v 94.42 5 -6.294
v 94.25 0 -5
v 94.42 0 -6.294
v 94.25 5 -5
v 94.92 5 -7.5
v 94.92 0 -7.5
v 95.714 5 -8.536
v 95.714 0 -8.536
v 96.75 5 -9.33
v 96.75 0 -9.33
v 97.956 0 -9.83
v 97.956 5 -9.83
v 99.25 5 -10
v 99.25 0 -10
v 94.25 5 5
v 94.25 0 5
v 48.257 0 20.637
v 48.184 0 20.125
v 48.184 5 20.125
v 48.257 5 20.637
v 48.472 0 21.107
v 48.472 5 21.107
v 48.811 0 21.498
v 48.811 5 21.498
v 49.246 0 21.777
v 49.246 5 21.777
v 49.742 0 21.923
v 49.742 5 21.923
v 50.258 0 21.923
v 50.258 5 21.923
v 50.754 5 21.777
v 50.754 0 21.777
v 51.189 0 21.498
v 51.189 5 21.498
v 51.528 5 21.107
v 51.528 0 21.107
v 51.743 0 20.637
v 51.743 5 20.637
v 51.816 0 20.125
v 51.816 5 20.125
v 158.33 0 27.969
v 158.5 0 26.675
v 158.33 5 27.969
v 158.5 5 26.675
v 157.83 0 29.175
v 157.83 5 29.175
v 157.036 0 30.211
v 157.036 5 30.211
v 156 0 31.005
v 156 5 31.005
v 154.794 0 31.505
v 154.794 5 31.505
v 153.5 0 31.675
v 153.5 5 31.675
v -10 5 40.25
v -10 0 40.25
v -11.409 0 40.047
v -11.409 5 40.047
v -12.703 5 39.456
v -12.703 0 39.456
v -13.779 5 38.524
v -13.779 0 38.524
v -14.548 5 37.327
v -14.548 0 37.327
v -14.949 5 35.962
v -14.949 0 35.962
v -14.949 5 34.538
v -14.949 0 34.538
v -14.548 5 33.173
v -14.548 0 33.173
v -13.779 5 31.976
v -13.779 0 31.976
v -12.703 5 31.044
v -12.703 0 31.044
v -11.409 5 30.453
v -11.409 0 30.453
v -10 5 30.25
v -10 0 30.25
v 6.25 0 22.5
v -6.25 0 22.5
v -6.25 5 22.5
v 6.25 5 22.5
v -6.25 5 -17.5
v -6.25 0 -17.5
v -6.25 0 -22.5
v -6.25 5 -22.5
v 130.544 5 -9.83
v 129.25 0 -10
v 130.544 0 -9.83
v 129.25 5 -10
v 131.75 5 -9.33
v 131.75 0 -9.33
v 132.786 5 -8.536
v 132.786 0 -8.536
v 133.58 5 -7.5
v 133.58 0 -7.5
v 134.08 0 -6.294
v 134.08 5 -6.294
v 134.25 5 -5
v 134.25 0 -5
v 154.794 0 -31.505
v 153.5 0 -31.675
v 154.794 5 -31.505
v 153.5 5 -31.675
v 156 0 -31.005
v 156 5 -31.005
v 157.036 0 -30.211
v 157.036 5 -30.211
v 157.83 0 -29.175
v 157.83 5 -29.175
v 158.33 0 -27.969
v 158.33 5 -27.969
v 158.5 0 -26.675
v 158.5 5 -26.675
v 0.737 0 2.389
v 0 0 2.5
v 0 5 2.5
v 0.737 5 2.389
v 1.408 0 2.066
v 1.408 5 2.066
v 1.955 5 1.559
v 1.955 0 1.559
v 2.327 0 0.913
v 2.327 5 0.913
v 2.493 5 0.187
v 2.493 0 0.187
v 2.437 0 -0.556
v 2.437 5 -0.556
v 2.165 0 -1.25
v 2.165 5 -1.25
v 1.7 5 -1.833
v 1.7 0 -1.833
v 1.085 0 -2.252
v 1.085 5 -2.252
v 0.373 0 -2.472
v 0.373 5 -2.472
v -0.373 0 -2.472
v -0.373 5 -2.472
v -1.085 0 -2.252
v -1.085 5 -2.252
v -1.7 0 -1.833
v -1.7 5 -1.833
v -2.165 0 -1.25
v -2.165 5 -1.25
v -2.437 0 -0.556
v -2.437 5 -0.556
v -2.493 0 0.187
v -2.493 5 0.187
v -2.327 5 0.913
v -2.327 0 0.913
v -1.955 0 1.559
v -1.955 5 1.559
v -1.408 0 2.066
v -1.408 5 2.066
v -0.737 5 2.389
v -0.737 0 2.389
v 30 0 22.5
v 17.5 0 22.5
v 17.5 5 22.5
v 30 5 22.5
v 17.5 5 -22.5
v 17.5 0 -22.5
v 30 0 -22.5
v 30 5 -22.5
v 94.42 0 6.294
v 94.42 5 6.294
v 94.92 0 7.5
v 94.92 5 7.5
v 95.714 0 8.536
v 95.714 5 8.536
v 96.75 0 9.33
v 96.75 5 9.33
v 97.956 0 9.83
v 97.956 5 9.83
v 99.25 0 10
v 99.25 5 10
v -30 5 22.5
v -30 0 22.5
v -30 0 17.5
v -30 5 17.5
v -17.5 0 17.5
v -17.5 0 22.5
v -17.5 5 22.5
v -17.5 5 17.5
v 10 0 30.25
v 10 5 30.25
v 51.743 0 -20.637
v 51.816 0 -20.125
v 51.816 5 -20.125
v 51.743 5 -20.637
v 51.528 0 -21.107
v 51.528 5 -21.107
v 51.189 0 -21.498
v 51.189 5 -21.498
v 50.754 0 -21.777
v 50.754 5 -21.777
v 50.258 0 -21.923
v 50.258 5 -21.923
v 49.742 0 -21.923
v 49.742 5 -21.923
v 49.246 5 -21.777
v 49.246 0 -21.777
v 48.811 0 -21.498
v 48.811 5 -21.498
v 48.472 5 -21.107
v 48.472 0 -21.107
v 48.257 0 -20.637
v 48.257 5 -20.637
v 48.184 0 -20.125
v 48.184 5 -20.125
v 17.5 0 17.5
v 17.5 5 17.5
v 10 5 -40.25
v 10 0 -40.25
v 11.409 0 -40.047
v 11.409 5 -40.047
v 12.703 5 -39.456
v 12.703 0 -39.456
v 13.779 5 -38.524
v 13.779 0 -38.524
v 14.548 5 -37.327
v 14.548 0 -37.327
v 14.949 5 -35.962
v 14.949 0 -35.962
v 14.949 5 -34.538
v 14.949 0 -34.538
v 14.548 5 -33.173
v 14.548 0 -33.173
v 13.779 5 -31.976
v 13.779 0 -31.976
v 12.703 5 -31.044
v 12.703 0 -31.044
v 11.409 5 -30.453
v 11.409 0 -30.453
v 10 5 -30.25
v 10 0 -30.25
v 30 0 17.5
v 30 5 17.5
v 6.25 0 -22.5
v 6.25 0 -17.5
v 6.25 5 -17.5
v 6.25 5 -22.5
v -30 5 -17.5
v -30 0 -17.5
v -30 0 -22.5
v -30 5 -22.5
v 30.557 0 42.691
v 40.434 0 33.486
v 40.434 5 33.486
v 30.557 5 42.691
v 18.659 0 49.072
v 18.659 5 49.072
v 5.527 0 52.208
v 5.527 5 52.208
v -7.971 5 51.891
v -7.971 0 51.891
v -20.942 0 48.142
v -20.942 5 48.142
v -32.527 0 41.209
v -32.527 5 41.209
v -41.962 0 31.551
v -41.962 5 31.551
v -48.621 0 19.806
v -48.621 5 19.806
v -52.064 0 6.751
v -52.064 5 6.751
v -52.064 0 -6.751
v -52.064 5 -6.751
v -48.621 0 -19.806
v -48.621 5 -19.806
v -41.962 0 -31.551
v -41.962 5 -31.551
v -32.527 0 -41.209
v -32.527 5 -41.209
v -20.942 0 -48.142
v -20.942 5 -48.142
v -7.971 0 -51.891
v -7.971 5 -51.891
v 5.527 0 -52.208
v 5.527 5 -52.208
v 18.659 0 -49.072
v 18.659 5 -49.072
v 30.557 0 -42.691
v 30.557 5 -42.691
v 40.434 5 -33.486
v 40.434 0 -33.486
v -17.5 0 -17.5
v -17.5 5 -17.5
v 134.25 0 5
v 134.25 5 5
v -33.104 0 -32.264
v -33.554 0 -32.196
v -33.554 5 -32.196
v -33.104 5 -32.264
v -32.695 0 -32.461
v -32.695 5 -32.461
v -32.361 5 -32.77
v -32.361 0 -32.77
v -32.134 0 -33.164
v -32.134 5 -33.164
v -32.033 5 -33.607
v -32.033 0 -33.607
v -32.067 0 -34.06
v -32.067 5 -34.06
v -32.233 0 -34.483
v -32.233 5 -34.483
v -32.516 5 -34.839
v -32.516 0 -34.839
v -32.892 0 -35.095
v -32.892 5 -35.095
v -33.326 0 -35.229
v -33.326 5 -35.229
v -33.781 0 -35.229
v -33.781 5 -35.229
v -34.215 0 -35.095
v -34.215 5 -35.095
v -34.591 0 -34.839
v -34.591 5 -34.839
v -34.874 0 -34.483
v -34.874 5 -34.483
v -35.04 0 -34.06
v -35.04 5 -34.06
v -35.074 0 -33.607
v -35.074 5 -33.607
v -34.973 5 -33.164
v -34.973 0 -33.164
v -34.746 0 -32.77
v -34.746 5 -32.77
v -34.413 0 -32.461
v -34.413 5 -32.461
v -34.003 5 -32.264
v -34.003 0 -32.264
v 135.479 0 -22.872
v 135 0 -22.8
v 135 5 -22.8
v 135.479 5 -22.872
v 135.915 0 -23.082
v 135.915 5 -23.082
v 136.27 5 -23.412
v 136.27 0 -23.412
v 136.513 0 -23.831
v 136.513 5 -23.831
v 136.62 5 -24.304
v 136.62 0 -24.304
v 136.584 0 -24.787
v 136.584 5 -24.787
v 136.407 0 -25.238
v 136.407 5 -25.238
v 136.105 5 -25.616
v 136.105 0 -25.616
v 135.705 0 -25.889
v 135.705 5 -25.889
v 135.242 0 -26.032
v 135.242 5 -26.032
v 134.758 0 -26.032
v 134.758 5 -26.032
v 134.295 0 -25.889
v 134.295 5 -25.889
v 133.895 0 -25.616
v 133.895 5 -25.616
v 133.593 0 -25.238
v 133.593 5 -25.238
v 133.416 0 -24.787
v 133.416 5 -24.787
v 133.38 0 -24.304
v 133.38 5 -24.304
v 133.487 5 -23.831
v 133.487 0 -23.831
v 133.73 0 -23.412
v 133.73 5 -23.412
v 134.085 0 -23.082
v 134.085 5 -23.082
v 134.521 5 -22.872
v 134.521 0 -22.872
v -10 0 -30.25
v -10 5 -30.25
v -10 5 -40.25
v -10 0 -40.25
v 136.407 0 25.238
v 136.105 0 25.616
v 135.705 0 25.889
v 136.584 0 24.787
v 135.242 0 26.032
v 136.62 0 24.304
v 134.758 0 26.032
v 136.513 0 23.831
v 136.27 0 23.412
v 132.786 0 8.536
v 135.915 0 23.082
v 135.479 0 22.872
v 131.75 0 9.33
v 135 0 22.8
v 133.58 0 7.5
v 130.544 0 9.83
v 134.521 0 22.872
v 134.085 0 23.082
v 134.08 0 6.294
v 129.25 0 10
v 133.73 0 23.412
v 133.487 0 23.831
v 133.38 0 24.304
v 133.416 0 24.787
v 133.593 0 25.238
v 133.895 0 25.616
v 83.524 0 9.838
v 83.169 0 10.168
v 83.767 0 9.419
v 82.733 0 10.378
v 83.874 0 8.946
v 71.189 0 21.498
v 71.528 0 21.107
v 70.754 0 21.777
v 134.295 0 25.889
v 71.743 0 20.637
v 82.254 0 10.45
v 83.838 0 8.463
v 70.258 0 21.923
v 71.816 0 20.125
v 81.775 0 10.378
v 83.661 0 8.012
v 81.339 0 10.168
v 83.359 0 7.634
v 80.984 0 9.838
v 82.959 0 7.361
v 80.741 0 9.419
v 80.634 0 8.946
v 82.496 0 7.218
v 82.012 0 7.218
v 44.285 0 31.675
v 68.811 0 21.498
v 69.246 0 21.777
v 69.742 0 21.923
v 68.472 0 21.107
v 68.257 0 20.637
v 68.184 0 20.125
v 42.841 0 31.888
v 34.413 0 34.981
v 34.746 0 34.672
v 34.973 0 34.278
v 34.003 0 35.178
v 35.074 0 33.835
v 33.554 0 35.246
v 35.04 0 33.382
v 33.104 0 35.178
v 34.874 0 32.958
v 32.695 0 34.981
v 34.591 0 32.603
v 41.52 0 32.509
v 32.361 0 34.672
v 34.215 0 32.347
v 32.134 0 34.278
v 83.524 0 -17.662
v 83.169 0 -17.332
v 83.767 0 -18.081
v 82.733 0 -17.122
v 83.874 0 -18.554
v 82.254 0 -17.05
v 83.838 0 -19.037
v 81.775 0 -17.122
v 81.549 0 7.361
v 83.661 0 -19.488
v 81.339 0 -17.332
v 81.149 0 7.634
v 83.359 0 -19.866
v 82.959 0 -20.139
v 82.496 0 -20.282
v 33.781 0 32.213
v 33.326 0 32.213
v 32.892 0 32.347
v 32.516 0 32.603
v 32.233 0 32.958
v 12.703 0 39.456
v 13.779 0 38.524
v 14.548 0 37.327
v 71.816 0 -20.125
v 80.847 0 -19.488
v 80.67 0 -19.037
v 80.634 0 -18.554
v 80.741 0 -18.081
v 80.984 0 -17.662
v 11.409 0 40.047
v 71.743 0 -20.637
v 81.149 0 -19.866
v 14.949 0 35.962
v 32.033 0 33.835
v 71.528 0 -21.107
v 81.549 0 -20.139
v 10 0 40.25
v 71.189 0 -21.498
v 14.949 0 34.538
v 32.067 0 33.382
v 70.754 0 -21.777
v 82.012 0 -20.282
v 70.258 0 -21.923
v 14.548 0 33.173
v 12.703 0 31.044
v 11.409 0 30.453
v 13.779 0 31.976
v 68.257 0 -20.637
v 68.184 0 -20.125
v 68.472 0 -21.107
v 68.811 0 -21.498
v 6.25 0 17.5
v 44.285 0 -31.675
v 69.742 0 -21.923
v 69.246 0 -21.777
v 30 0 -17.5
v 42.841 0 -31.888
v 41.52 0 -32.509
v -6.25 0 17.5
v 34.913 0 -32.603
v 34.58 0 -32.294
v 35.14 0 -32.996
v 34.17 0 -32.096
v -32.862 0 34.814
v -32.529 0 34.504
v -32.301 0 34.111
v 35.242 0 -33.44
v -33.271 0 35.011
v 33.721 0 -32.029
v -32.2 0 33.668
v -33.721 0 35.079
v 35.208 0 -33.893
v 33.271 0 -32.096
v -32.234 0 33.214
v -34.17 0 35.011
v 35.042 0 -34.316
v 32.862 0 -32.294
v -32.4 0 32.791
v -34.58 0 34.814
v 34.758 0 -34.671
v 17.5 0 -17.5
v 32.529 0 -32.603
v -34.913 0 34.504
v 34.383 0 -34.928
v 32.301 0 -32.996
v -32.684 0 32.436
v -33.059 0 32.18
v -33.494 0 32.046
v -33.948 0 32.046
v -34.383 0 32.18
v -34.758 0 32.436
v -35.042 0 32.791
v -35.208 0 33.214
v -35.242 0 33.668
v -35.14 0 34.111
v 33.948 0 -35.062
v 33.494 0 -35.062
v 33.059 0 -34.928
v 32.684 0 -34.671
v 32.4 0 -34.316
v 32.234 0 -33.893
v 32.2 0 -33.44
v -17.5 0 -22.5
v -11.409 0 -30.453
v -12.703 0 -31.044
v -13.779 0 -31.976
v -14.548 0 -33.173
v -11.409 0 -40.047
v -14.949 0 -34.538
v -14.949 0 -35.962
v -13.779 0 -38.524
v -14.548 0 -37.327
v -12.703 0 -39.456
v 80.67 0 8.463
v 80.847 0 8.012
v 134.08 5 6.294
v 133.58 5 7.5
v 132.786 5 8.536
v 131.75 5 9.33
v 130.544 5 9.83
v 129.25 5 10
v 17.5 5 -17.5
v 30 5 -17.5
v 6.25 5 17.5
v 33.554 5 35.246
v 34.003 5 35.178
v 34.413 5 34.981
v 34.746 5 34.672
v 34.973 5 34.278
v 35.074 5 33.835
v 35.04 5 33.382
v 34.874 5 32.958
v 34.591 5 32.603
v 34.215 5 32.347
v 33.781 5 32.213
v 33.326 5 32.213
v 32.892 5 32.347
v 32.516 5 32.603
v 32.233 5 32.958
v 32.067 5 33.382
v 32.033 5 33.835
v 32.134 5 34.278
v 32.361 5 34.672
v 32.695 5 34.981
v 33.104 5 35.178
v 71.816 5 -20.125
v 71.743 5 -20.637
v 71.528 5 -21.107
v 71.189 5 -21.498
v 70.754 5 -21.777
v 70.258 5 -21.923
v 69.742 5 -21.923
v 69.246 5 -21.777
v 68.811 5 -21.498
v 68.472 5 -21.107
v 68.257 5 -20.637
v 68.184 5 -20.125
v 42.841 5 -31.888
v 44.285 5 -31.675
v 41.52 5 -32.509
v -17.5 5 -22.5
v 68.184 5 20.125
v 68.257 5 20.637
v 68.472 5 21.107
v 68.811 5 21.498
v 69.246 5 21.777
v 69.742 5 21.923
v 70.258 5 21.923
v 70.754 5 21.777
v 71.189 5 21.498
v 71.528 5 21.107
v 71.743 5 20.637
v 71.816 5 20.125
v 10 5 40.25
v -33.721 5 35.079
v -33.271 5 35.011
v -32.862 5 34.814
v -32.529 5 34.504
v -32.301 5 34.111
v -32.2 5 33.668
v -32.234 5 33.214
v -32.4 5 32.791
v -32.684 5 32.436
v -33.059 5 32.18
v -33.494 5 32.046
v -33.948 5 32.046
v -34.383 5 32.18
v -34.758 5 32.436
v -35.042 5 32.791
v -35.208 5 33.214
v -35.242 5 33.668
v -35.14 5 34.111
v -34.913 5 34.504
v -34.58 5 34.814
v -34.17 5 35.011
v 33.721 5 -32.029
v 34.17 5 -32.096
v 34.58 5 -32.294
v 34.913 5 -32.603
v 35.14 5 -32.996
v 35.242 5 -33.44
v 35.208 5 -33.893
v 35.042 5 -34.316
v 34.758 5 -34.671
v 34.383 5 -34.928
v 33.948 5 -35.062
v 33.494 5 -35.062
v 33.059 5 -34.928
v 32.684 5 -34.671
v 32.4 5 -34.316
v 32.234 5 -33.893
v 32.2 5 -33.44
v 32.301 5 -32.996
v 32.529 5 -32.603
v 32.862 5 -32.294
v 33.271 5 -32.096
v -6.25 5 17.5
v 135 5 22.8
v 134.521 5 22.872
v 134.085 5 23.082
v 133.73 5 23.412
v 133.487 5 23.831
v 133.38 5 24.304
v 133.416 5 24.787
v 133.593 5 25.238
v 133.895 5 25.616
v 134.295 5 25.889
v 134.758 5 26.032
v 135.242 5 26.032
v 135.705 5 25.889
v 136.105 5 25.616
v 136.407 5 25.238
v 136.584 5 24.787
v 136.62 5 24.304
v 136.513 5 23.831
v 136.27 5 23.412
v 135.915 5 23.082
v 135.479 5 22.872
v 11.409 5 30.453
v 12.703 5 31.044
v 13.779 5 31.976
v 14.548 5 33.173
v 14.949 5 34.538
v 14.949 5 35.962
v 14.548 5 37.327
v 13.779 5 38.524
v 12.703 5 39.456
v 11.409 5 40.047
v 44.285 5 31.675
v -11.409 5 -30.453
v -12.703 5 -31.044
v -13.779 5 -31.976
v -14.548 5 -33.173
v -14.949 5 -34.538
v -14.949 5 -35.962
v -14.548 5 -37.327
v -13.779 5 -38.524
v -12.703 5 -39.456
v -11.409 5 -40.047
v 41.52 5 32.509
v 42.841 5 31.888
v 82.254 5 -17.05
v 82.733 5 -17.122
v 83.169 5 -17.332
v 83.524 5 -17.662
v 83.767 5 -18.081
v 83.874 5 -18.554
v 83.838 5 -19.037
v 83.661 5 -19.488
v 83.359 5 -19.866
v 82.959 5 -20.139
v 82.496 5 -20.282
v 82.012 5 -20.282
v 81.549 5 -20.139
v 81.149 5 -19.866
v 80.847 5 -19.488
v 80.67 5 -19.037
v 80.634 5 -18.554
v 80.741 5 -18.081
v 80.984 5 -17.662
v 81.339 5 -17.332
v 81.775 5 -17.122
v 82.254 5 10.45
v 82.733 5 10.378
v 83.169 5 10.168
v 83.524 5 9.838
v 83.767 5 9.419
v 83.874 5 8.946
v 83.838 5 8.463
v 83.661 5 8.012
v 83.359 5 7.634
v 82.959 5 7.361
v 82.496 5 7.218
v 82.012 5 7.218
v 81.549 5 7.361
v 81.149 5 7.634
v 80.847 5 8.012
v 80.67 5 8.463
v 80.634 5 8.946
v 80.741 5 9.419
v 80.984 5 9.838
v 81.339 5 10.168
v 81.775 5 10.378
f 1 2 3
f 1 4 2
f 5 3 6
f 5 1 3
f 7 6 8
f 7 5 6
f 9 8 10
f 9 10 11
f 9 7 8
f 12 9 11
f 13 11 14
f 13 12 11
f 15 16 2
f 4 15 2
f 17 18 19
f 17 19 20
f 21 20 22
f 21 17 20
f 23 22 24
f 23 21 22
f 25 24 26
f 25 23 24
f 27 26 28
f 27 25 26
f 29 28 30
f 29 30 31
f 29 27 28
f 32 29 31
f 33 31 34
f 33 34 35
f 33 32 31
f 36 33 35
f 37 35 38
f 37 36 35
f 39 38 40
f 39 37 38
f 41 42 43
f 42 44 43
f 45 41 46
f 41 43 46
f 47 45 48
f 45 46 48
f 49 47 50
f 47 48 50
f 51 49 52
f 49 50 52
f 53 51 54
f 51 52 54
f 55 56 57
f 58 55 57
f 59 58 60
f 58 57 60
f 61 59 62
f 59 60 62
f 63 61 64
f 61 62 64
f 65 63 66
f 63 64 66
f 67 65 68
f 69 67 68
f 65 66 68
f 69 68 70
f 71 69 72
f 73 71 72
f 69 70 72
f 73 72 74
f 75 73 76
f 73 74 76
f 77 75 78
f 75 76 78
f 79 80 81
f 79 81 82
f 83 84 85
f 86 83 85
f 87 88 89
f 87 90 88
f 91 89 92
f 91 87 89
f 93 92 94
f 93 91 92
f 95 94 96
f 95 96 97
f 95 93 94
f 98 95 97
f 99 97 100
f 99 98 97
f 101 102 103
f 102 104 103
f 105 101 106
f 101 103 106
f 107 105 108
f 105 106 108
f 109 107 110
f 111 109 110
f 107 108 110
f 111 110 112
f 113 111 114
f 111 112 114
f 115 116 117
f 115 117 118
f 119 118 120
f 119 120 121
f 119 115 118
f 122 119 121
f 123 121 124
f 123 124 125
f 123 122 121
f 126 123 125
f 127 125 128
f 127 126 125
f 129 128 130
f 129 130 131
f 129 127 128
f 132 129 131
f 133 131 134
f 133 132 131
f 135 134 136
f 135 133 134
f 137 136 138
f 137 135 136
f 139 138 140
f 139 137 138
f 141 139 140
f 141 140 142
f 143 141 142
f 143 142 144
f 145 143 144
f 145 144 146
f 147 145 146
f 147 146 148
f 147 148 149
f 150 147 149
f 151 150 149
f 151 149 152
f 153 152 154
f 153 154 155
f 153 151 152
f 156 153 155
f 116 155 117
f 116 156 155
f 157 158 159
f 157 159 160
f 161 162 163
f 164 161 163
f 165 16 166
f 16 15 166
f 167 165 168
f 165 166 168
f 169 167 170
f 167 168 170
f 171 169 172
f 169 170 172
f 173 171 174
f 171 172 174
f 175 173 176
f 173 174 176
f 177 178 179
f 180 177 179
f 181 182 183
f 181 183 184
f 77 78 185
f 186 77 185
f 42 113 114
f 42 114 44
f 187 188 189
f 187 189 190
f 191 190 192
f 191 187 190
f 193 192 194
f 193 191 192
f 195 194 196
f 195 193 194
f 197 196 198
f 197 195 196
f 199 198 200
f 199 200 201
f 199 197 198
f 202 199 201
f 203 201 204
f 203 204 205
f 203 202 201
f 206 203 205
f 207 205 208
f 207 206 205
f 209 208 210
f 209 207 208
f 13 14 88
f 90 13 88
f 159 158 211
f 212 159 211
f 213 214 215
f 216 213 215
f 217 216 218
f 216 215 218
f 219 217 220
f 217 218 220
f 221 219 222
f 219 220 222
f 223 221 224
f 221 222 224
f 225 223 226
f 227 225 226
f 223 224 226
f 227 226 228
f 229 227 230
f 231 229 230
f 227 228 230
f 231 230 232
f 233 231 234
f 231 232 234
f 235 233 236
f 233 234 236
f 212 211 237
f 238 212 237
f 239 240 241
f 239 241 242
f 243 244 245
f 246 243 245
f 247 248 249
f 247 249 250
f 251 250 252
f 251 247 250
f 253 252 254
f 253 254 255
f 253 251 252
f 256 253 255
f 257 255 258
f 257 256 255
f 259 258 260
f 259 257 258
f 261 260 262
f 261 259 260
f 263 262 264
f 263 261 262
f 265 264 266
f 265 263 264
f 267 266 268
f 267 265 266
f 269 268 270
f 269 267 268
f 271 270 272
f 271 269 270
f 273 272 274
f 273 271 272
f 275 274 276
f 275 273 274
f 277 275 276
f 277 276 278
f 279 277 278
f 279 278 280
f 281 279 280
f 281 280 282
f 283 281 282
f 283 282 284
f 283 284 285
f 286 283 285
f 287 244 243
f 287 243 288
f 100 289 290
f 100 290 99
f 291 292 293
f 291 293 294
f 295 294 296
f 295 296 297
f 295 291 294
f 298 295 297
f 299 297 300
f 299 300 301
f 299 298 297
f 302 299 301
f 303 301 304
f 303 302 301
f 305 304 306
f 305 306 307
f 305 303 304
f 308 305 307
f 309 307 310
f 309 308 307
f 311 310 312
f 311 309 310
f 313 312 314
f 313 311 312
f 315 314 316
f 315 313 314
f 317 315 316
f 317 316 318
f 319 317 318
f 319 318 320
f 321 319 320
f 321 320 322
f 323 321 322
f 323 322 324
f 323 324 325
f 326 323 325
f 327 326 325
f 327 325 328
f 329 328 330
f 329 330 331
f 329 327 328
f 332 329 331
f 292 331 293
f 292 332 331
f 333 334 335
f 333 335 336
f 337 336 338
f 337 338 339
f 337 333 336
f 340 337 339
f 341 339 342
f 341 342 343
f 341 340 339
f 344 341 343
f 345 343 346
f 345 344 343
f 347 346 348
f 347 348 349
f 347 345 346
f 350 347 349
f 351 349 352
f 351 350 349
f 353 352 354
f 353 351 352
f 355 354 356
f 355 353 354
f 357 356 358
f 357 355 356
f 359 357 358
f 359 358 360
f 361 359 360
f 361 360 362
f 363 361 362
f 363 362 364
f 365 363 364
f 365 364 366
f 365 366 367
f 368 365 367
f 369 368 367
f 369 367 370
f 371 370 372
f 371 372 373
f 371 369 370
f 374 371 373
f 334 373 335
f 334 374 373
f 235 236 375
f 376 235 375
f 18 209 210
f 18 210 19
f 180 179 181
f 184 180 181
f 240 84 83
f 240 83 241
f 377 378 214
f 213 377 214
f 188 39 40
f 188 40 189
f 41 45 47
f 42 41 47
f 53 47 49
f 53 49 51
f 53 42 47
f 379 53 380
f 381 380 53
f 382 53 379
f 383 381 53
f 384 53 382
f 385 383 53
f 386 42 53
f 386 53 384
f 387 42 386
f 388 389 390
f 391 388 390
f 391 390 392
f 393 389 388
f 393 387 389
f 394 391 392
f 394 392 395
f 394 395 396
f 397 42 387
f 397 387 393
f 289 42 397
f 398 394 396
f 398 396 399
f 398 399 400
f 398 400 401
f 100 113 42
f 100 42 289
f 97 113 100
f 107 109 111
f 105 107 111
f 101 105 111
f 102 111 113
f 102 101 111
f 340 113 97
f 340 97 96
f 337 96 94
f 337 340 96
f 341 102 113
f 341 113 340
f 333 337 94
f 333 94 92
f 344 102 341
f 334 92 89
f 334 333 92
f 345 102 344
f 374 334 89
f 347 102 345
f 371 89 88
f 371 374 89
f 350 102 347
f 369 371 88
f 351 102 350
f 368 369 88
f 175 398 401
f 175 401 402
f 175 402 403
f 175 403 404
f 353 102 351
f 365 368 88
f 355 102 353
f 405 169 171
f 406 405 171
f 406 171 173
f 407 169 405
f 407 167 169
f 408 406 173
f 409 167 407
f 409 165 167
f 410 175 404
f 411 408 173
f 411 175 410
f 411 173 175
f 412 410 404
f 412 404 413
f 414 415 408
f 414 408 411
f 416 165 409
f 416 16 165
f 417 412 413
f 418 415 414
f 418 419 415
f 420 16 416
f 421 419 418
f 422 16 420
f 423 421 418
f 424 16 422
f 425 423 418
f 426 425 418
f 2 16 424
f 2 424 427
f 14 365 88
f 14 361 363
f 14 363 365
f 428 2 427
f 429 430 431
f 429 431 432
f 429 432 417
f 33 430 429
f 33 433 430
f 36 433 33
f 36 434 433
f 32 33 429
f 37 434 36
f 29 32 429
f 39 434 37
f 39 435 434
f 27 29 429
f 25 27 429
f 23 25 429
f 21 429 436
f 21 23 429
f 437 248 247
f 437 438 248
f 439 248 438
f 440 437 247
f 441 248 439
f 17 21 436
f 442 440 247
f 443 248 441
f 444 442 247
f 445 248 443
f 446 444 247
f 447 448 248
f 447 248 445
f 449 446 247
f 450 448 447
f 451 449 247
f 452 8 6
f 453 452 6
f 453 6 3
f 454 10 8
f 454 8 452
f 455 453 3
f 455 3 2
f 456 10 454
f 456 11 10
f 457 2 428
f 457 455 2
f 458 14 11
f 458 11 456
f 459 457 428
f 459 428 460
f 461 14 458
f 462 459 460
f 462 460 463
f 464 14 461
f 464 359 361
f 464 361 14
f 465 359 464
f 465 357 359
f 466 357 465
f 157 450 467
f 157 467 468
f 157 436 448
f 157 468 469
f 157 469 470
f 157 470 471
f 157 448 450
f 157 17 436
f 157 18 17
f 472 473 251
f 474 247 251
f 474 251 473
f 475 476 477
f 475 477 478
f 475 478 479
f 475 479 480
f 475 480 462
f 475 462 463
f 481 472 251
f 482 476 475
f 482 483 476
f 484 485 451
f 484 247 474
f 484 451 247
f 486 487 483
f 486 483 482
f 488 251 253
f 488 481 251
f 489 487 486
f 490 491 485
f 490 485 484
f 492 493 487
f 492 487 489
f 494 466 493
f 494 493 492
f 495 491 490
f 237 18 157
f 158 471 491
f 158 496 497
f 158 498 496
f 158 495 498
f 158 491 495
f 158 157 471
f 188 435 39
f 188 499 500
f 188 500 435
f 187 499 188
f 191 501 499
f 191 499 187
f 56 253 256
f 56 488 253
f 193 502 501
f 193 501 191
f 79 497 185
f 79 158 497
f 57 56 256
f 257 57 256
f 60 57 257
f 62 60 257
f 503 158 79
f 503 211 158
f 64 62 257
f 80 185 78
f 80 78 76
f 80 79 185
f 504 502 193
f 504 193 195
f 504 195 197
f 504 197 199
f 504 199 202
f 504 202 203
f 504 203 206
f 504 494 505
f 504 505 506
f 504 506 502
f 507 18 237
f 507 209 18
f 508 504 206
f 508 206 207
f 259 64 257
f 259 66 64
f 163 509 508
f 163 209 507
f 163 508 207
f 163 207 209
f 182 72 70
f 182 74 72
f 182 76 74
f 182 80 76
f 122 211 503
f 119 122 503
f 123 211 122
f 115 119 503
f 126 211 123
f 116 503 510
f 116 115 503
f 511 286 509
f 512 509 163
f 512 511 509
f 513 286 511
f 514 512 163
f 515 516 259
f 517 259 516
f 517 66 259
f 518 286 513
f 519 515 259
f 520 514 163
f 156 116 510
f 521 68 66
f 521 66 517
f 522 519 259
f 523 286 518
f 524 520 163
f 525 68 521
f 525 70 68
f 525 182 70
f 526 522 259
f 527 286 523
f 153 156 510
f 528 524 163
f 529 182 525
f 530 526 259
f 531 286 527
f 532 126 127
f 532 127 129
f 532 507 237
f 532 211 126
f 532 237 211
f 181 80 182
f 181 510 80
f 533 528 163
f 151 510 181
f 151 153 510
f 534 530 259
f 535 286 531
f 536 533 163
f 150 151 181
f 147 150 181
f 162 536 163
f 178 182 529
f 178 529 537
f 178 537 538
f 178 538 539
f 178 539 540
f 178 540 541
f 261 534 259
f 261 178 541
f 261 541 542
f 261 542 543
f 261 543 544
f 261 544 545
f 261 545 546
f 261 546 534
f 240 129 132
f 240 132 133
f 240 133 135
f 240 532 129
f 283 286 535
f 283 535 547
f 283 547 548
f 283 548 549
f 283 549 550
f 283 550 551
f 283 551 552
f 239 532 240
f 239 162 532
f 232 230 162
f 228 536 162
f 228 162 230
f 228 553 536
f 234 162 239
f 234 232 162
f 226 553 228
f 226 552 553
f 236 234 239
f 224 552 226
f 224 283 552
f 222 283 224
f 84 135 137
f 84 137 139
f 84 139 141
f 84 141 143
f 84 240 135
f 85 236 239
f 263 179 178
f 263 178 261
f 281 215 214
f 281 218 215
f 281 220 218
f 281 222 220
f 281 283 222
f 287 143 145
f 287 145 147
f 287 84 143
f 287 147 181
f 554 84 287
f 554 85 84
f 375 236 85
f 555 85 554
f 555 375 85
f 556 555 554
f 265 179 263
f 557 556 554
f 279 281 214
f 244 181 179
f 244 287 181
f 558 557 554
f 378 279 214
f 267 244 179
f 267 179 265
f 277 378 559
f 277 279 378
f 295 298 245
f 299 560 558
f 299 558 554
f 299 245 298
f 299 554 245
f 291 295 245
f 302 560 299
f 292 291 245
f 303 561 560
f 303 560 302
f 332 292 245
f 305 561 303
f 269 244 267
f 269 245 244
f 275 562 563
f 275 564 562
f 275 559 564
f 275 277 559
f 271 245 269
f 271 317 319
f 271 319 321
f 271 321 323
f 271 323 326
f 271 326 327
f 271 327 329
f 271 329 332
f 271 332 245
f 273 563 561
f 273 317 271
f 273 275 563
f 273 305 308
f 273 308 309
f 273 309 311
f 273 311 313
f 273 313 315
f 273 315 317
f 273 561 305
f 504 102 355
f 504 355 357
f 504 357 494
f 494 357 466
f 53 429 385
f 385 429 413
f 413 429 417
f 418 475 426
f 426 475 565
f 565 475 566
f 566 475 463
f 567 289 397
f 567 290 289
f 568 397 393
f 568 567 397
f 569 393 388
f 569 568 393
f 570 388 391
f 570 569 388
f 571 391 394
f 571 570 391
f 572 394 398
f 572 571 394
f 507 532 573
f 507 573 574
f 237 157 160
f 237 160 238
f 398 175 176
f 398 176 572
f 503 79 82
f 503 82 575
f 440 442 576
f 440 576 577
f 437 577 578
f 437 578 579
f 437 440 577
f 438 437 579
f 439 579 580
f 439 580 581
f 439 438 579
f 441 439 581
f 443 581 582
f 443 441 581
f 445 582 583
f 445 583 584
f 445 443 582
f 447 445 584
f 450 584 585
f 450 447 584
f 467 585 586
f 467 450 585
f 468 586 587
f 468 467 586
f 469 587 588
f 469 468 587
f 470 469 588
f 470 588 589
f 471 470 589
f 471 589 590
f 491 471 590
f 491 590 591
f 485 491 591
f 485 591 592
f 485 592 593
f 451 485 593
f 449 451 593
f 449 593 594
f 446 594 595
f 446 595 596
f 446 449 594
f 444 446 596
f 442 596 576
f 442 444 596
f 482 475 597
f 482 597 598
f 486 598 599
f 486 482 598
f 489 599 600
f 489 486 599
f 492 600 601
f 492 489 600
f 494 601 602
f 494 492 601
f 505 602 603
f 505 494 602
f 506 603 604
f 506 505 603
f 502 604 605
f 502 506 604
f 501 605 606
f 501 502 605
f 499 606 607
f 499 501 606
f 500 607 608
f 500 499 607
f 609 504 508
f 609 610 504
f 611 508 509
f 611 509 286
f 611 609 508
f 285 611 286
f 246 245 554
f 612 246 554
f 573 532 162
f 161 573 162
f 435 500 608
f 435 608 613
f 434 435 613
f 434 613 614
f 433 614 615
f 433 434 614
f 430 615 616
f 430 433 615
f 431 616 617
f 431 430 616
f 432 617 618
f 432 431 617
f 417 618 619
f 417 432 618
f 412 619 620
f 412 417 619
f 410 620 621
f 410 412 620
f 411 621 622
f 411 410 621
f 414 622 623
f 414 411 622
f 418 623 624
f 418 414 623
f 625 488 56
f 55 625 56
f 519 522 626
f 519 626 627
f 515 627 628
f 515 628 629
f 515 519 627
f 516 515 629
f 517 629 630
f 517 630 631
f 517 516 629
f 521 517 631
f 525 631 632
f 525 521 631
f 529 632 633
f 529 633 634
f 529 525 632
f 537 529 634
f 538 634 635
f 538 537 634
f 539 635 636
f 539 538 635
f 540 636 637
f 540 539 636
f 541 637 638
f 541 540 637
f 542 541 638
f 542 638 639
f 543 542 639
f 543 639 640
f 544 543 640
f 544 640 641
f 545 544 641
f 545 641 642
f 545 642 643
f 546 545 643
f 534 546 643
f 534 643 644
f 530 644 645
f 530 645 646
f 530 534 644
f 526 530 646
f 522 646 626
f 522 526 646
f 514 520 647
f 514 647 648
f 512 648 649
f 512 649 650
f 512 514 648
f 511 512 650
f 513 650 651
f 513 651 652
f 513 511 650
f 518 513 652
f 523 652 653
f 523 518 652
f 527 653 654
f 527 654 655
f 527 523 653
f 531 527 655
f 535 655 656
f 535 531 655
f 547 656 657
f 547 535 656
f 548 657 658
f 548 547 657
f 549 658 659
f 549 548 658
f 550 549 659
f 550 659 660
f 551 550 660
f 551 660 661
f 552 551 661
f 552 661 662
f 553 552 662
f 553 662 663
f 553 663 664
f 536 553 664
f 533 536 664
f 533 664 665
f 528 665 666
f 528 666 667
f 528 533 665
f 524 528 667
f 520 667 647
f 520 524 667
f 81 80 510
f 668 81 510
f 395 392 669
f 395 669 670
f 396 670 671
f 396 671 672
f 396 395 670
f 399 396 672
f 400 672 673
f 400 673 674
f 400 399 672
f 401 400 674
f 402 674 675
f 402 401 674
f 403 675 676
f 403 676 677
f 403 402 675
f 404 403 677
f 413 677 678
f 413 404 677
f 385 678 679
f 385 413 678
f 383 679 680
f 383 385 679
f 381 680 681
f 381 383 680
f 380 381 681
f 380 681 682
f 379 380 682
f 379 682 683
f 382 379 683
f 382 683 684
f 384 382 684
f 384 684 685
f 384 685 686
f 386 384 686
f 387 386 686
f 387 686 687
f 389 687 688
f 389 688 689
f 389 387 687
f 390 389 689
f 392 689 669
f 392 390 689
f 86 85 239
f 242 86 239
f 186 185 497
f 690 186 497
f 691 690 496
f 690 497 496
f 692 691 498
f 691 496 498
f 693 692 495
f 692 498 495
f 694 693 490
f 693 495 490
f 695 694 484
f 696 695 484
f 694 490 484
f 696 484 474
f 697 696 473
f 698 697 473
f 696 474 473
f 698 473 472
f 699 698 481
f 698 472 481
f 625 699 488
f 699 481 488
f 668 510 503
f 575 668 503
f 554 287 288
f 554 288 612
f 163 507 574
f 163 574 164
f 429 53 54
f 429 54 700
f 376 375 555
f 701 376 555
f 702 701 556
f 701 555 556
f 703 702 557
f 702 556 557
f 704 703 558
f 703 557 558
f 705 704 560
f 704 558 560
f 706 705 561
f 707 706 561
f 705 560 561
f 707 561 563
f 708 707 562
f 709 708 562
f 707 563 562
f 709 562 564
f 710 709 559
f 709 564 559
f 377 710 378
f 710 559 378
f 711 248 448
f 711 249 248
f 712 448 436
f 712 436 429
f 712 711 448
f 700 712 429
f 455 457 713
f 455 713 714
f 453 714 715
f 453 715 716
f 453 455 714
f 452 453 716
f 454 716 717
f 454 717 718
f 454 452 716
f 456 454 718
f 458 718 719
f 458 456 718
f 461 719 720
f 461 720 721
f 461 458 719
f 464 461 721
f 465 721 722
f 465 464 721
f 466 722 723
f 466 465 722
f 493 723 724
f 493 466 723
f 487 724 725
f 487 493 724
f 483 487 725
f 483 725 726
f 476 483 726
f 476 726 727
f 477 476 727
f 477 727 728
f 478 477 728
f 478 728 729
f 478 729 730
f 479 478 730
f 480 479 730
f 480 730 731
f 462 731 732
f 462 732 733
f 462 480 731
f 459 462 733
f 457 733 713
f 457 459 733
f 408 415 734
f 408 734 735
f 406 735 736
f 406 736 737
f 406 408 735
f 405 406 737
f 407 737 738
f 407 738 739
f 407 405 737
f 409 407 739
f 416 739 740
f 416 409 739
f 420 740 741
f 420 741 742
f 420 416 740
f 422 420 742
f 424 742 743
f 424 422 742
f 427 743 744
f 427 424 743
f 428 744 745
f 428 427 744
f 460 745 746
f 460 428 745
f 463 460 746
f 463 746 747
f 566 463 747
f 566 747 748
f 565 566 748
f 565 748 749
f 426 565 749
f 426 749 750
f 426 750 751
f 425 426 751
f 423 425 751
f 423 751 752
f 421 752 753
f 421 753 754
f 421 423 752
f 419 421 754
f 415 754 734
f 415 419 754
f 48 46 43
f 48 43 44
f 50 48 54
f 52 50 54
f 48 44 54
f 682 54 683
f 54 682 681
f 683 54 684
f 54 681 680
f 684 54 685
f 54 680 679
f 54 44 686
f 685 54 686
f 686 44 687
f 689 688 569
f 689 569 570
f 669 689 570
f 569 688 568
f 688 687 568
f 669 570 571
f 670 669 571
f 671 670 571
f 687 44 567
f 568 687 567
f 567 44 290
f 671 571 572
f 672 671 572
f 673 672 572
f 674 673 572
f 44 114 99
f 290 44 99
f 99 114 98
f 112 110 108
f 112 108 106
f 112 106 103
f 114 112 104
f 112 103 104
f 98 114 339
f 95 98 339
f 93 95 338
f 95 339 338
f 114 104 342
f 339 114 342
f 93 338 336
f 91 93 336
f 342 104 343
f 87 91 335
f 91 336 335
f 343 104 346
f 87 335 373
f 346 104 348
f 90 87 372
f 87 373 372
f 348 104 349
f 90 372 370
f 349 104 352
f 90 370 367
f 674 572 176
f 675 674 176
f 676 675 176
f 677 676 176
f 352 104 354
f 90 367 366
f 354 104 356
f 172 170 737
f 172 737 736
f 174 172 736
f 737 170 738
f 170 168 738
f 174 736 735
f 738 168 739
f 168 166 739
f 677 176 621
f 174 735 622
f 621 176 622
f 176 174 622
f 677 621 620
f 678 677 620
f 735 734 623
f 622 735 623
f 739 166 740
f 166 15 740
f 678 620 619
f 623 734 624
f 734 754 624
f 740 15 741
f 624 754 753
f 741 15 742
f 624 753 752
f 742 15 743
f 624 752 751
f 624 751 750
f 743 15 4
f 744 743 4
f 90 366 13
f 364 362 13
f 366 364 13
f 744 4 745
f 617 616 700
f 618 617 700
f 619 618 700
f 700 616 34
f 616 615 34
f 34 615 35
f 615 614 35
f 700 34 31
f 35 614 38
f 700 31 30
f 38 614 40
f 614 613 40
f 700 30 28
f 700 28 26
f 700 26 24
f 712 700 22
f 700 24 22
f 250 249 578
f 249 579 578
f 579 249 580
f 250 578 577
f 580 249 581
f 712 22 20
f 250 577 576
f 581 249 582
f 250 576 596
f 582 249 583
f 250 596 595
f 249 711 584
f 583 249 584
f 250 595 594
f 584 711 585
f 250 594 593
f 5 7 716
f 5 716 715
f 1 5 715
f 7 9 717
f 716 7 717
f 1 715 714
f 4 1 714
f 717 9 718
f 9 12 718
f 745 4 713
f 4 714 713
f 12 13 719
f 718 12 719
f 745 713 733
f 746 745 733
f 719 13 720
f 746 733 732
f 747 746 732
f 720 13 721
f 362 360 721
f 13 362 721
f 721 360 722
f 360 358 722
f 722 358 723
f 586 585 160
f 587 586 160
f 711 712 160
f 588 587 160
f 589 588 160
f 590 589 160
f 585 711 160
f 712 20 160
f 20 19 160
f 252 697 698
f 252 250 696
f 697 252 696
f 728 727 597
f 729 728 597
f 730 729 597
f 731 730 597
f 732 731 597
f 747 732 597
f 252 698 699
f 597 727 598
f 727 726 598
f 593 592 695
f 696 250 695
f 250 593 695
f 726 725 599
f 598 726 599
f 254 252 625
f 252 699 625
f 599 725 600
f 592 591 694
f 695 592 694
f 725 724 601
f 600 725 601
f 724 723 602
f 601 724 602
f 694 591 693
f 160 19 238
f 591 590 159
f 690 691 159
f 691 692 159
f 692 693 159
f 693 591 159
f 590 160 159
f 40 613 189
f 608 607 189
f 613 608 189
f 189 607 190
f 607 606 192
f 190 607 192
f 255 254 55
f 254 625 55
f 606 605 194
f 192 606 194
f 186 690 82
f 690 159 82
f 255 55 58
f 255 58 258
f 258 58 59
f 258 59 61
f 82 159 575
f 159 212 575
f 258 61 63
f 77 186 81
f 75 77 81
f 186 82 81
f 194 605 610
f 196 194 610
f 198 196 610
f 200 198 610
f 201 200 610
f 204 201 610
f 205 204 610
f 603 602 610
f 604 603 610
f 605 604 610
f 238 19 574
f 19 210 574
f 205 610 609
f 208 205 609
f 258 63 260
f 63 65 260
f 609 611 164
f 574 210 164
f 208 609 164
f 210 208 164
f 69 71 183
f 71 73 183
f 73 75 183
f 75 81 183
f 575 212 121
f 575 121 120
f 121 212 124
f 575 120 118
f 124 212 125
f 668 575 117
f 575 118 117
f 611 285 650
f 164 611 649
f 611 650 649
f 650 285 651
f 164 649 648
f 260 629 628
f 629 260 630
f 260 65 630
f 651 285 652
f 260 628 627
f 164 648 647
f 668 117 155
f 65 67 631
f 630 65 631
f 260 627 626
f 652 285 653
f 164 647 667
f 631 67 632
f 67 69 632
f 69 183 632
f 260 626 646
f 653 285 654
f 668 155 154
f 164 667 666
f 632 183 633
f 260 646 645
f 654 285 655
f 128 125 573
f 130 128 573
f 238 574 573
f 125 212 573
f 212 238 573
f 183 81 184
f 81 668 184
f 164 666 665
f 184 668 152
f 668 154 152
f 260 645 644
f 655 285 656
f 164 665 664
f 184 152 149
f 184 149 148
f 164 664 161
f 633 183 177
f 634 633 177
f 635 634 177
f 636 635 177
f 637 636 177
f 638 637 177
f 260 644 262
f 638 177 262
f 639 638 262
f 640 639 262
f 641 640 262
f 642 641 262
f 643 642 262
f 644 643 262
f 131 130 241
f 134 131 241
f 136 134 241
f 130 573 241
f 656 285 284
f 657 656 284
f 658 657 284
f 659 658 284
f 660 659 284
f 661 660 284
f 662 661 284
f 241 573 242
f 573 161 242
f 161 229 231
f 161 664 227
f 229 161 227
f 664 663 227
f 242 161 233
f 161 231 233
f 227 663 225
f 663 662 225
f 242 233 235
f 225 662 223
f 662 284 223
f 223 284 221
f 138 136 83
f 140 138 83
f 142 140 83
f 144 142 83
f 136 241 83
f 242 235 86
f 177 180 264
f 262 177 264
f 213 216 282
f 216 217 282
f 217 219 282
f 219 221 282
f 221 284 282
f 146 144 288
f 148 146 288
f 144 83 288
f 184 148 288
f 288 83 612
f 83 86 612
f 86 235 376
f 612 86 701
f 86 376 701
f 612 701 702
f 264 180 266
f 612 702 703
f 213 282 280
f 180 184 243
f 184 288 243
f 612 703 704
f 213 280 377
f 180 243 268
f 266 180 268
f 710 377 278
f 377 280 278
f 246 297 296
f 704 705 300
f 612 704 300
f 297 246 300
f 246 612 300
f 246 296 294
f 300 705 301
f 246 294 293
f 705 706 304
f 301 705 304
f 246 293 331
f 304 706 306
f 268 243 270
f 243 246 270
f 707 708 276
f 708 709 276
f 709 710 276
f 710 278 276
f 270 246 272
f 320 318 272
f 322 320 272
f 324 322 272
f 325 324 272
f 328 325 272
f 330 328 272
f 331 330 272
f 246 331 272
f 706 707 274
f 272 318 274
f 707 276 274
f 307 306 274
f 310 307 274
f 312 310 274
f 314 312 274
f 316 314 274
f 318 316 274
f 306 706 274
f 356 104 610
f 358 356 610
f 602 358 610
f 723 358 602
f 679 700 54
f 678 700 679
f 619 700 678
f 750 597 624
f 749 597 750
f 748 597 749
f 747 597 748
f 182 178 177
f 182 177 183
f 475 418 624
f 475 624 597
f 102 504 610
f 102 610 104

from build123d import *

# Parameters (mm, degrees)
SKETCH_1_R      = 1.525
SKETCH_1_R_2    = 2.5
SKETCH_1_R_3    = 1.625
SKETCH_1_W      = 12.5
SKETCH_1_H      = 5
SKETCH_1_W_2    = 40
SKETCH_1_H_2    = 20
EXTRUDE_1_DEPTH = 5
FILLET_1_R      = 5


with BuildPart() as part:
    # 草图1 → 凸台-拉伸1 (new body)
    with BuildSketch(Plane(origin=(0, 0, 0), x_dir=(1, 0, 0), z_dir=(0, 1, 0))):
        with BuildLine():
            Line((41.868178549, 31.675), (158.5, 31.675))
            Line((158.5, 31.675), (158.5, -31.675))
            Line((158.5, -31.675), (41.868178549, -31.675))
            ThreePointArc((41.868178549, -31.675), (-52.5, 0), (41.868178549, 31.675))
        make_face()
        with Locations(Location((-33.55358156, 33.720895004, 0), (0, 0, 270))):
            Circle(SKETCH_1_R, mode=Mode.SUBTRACT)
        with Locations(Location((0, 0, 0), (0, 0, 270))):
            Circle(SKETCH_1_R_2, mode=Mode.SUBTRACT)
        with Locations(Location((82.254, 18.675, 0), (0, 0, 270))):
            Circle(SKETCH_1_R_3, mode=Mode.SUBTRACT)
        with Locations(Location((82.254, -8.825, 0), (0, 0, 270))):
            Circle(SKETCH_1_R_3, mode=Mode.SUBTRACT)
        with Locations(Location((135, 24.425, 0), (0, 0, 270))):
            Circle(SKETCH_1_R_3, mode=Mode.SUBTRACT)
        with Locations(Location((135, -24.425, 0), (0, 0, 90))):
            Circle(SKETCH_1_R_3, mode=Mode.SUBTRACT)
        with Locations(Location((33.720895004, 33.55358156, 0), (0, 0, 270))):
            Circle(SKETCH_1_R, mode=Mode.SUBTRACT)
        with Locations(Location((33.55358156, -33.720895004, 0), (0, 0, 270))):
            Circle(SKETCH_1_R, mode=Mode.SUBTRACT)
        with Locations(Location((-33.720895004, -33.55358156, 0), (0, 0, 270))):
            Circle(SKETCH_1_R, mode=Mode.SUBTRACT)
        with Locations((23.75, -20)):
            Rectangle(SKETCH_1_W, SKETCH_1_H, mode=Mode.SUBTRACT)
        with Locations((-23.75, 20)):
            Rectangle(SKETCH_1_W, SKETCH_1_H, mode=Mode.SUBTRACT)
        with Locations((0, 20)):
            Rectangle(SKETCH_1_W, SKETCH_1_H, mode=Mode.SUBTRACT)
        with Locations((23.75, 20)):
            Rectangle(SKETCH_1_W, SKETCH_1_H, mode=Mode.SUBTRACT)
        with Locations((0, -20)):
            Rectangle(SKETCH_1_W, SKETCH_1_H, mode=Mode.SUBTRACT)
        with Locations((-23.75, -20)):
            Rectangle(SKETCH_1_W, SKETCH_1_H, mode=Mode.SUBTRACT)
        with BuildLine():
            Line((-10, -30.25), (10, -30.25))
            ThreePointArc((10, -30.25), (15, -35.25), (10, -40.25))
            Line((10, -40.25), (-10, -40.25))
            ThreePointArc((-10, -40.25), (-15, -35.25), (-10, -30.25))
        make_face(mode=Mode.SUBTRACT)
        with BuildLine():
            Line((-10, 40.25), (10, 40.25))
            ThreePointArc((10, 40.25), (15, 35.25), (10, 30.25))
            Line((10, 30.25), (-10, 30.25))
            ThreePointArc((-10, 30.25), (-15, 35.25), (-10, 40.25))
        make_face(mode=Mode.SUBTRACT)
        with BuildLine():
            Line((48.183761531, 20.125053296), (48.183761531, -20.125053296))
            ThreePointArc((48.183761531, -20.125053296), (50, -21.941291765), (51.816238469, -20.125053296))
            Line((51.816238469, -20.125053296), (51.816238469, 20.125053296))
            ThreePointArc((51.816238469, 20.125053296), (50, 21.941291765), (48.183761531, 20.125053296))
        make_face(mode=Mode.SUBTRACT)
        with BuildLine():
            Line((68.183761531, 20.125053296), (68.183761531, -20.125053296))
            ThreePointArc((68.183761531, -20.125053296), (70, -21.941291765), (71.816238469, -20.125053296))
            Line((71.816238469, -20.125053296), (71.816238469, 20.125053296))
            ThreePointArc((71.816238469, 20.125053296), (70, 21.941291765), (68.183761531, 20.125053296))
        make_face(mode=Mode.SUBTRACT)
        with Locations((114.25, 0)):
            Rectangle(SKETCH_1_W_2, SKETCH_1_H_2, mode=Mode.SUBTRACT)
    extrude(amount=EXTRUDE_1_DEPTH)

    # 圆角1
    fillet_1_edges = [part.edges().sort_by_distance(p)[0] for p in [
        (94.25, 2.5, -10),
        (94.25, 2.5, 10),
        (134.25, 2.5, 10),
        (134.25, 2.5, -10),
        (41.868178549, 2.5, -31.675),
        (158.5, 2.5, -31.675),
        (158.5, 2.5, 31.675),
        (41.868178549, 2.5, 31.675),
    ]]
    fillet(fillet_1_edges, radius=FILLET_1_R)


solid = part.part
